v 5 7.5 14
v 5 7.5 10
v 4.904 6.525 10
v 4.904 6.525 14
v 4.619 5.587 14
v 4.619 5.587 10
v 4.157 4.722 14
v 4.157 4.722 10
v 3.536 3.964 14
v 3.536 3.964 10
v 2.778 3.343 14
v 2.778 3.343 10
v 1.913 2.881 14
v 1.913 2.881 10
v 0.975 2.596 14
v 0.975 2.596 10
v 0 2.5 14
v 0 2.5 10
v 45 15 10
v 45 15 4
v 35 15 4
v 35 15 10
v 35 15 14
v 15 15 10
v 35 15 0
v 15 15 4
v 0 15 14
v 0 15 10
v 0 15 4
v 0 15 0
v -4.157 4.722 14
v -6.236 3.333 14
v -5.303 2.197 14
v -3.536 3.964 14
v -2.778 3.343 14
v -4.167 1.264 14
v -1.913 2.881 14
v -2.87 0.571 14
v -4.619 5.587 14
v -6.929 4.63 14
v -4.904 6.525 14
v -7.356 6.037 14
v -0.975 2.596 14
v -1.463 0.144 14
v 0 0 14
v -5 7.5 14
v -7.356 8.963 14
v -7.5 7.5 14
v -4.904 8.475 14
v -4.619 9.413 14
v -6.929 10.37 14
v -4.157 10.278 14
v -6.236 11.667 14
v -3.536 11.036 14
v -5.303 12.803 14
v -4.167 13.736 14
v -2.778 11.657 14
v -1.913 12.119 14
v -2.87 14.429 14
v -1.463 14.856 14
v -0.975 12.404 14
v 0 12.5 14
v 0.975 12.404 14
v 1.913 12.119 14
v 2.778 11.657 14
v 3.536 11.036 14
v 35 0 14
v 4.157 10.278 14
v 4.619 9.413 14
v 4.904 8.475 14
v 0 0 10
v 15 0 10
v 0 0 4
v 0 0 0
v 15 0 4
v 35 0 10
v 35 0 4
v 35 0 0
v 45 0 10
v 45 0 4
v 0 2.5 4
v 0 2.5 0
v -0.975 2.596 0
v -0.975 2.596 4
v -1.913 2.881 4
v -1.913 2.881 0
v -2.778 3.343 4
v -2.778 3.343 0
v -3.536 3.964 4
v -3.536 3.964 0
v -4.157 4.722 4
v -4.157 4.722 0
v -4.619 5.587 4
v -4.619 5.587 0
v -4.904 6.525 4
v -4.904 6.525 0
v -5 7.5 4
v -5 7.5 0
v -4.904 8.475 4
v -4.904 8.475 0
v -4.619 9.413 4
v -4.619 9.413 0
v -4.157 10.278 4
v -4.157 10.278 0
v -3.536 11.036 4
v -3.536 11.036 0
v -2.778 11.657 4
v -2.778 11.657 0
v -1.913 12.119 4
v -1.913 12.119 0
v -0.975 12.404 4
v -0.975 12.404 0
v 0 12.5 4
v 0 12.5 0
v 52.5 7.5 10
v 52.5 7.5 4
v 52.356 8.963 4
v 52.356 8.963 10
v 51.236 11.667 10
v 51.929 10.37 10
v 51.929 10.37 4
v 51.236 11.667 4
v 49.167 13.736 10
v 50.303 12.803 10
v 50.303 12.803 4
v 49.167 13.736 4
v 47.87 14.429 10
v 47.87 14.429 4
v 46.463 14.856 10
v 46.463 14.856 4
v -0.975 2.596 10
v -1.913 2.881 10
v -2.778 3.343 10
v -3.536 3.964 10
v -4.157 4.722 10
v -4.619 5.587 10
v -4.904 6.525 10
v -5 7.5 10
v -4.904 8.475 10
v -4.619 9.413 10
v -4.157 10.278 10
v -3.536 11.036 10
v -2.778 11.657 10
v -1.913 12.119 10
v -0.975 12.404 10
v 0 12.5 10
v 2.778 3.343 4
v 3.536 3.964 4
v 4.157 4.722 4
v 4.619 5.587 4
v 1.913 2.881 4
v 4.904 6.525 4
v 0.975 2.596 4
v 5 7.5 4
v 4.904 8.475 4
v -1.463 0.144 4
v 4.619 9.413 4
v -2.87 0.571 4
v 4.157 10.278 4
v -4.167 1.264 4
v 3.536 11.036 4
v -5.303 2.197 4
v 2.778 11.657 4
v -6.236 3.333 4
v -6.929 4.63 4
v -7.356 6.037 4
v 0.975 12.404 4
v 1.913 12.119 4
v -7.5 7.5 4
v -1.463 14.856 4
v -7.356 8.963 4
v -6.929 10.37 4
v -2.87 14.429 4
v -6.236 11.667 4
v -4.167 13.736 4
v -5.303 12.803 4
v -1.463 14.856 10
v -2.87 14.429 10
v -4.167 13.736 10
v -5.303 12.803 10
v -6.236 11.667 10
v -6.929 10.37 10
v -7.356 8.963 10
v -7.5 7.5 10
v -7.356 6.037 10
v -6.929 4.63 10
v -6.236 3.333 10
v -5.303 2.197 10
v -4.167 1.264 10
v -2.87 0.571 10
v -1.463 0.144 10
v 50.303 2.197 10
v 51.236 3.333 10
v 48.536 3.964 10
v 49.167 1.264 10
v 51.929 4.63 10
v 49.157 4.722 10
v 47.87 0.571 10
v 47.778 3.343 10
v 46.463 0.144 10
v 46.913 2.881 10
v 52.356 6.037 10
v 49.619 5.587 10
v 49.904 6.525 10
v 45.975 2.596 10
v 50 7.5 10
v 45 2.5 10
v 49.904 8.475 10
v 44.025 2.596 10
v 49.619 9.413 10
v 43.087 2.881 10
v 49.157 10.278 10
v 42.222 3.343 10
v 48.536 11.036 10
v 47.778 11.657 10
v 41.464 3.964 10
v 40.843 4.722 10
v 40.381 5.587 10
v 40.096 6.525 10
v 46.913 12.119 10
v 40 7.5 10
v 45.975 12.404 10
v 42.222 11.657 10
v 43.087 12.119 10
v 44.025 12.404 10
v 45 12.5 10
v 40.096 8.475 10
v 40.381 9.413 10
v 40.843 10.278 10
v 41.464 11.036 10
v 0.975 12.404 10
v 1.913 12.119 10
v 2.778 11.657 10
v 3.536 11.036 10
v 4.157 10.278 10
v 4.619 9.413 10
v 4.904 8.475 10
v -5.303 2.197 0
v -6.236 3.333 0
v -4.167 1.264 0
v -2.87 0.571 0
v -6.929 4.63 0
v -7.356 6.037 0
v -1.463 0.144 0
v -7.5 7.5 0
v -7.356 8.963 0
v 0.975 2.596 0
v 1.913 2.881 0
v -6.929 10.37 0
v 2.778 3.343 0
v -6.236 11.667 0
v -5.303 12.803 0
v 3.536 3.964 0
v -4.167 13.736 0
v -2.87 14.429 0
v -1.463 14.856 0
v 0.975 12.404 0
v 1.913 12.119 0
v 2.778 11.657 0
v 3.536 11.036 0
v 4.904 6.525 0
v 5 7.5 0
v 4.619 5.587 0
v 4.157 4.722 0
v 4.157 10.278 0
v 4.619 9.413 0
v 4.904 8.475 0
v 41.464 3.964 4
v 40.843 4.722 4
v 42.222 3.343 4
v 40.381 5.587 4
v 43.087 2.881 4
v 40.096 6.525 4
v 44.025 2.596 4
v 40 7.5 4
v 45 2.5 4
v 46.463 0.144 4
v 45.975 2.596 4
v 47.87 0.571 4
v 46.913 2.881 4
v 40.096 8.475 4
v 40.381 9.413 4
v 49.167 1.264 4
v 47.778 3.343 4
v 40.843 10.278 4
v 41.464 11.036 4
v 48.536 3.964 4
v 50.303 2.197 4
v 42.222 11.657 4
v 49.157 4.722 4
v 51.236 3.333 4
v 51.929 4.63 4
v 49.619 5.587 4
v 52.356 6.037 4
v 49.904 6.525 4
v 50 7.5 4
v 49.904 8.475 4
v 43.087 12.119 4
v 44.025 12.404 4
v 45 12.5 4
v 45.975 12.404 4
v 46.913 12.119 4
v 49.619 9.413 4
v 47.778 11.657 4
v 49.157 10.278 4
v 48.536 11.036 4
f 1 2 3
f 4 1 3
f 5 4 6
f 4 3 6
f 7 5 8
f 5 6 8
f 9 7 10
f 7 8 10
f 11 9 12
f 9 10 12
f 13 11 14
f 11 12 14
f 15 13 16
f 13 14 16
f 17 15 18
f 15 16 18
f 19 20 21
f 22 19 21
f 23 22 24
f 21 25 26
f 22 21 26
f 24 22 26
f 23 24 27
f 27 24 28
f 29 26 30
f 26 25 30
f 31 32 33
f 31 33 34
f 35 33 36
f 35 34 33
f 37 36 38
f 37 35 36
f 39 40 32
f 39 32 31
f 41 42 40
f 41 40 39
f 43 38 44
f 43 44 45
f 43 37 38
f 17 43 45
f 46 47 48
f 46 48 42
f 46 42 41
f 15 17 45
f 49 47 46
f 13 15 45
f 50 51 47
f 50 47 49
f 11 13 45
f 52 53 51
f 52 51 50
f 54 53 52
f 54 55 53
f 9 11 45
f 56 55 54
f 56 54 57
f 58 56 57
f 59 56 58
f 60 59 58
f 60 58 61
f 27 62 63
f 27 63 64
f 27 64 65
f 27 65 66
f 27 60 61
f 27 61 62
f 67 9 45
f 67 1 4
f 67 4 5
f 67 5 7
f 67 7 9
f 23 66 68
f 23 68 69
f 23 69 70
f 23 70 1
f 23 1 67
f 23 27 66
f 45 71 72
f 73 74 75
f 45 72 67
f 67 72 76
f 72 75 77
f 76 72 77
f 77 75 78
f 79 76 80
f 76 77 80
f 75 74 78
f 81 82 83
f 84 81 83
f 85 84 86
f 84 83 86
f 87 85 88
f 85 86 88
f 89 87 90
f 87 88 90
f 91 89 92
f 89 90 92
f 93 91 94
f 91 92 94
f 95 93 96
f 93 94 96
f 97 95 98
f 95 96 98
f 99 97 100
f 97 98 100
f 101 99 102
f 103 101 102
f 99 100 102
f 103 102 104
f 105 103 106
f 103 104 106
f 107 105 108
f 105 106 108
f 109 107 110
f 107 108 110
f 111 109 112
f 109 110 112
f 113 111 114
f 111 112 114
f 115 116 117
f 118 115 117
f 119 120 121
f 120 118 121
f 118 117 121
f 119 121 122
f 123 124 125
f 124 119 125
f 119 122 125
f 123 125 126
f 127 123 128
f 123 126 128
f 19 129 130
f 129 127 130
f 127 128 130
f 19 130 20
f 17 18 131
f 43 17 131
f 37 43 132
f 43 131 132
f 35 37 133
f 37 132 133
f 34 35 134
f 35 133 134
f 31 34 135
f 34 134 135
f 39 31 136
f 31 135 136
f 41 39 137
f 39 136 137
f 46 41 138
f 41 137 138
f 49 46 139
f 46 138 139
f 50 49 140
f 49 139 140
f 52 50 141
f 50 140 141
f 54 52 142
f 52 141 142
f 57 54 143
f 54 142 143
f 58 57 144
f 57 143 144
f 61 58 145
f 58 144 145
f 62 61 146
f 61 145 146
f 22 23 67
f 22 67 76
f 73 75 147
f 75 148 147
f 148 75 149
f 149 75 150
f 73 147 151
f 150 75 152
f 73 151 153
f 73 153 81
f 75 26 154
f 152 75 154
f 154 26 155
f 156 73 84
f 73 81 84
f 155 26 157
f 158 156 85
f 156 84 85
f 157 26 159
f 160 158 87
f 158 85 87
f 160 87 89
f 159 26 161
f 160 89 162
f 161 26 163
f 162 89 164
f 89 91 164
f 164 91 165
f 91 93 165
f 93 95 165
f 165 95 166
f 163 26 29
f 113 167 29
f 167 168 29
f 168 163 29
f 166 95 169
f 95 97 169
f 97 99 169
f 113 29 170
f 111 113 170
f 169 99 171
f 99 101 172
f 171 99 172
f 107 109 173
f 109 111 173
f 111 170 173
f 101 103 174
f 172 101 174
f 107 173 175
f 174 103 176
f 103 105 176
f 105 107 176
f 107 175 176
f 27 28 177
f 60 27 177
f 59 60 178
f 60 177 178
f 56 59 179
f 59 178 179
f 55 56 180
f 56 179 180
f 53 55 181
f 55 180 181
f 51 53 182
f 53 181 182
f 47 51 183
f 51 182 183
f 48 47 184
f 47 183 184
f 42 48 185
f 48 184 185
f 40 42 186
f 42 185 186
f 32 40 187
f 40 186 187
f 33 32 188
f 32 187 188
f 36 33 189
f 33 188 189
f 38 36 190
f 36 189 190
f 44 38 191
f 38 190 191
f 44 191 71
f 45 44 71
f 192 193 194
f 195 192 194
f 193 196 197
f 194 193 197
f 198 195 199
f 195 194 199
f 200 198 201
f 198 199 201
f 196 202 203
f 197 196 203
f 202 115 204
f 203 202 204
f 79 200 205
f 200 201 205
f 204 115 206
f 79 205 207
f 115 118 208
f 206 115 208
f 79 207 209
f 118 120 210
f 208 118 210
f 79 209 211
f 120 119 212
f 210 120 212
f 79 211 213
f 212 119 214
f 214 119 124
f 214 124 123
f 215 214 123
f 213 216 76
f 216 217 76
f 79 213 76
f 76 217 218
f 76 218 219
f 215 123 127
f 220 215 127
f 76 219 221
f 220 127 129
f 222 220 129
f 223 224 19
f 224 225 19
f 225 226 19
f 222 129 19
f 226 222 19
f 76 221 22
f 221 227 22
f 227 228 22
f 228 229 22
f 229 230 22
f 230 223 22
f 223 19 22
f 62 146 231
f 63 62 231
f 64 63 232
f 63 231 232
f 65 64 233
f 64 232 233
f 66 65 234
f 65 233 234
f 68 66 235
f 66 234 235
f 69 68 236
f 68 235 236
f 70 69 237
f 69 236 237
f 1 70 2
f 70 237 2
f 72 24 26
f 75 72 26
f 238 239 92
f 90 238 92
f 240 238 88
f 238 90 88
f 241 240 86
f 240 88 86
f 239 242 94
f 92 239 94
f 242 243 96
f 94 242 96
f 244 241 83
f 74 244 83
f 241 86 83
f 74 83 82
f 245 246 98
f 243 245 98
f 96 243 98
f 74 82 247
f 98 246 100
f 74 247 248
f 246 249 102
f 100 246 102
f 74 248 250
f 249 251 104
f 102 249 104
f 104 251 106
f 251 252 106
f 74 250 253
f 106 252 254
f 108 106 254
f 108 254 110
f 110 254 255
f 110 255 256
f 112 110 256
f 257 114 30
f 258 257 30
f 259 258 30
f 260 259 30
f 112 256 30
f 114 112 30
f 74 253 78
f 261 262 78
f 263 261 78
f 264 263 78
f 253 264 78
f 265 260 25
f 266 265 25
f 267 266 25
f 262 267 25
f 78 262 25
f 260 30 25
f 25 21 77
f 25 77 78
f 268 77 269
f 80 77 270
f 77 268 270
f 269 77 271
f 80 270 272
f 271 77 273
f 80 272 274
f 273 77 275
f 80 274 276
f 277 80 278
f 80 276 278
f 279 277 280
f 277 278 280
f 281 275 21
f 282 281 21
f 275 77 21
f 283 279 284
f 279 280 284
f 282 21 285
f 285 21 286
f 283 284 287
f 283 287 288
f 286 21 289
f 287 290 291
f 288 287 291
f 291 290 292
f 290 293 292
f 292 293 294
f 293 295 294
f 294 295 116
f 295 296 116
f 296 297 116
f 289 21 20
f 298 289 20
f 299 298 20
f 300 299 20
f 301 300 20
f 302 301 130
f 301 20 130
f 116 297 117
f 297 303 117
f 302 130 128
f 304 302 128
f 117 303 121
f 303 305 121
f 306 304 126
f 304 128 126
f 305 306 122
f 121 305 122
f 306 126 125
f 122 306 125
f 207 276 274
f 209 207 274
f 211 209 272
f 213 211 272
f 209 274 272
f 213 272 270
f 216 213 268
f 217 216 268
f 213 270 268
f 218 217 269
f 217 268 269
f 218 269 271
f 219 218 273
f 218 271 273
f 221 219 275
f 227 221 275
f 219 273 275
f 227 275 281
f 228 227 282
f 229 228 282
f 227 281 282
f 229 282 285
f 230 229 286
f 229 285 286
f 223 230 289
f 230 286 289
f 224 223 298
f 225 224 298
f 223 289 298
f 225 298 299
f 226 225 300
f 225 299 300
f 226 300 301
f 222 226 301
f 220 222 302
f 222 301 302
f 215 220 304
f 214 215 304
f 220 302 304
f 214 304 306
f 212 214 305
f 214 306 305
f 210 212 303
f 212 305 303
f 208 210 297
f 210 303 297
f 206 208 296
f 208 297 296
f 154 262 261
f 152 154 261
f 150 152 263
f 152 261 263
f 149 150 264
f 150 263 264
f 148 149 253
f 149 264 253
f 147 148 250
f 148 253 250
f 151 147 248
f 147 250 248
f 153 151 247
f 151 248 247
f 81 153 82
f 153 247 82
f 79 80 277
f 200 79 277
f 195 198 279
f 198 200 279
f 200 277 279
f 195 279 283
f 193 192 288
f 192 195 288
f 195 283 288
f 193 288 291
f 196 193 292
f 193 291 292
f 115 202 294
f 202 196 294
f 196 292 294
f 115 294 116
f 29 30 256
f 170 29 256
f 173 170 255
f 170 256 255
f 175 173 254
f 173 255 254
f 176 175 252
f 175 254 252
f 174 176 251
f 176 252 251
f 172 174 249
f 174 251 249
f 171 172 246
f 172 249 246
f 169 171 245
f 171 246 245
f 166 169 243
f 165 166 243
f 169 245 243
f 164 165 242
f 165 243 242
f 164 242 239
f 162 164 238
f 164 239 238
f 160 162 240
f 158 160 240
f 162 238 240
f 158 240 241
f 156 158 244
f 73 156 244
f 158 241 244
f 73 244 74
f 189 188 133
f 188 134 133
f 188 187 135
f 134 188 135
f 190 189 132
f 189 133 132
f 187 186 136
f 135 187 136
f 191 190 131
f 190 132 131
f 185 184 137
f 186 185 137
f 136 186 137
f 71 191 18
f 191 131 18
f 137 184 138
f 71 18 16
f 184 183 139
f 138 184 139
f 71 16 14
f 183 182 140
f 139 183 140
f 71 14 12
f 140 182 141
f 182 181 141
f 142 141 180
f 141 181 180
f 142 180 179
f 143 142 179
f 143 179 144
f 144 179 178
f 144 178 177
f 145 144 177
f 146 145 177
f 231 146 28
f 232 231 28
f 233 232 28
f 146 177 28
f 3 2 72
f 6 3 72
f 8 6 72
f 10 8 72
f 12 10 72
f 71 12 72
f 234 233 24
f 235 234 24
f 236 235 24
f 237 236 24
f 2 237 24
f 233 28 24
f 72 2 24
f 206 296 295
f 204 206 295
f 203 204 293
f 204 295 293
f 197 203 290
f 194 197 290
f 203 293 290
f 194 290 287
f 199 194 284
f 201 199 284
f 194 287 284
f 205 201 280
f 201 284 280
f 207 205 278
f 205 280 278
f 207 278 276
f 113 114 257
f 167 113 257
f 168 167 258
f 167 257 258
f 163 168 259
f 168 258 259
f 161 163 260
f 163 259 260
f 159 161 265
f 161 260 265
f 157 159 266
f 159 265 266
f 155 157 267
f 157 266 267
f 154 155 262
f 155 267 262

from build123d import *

# Parameters (mm, degrees)
BOSS_EXTRU_1_DEPTH      = 14
ESQUISSE2_W             = 7.5
ESQUISSE2_H             = 6
ESQUISSE2_W_2           = 15
ESQUISSE2_W_3           = 10
ESQUISSE2_H_2           = 4
ENL_V_MAT_EXTRU_1_DEPTH = 15


with BuildPart() as part:
    # Esquisse1 → Boss.-Extru.1 (new body)
    with BuildSketch(Plane.XY):
        with BuildLine():
            ThreePointArc((7.5, 7.5), (5.303300859, 2.196699141), (0, 0))
            Line((0, 0), (45, 0))
            ThreePointArc((45, 0), (37.5, 7.5), (45, 15))
            Line((45, 15), (0, 15))
            ThreePointArc((0, 15), (5.303300859, 12.803300859), (7.5, 7.5))
        make_face()
        with BuildLine():
            ThreePointArc((45, 15), (37.5, 7.5), (45, 0))
            Line((45, 0), (45, 2.5))
            ThreePointArc((45, 2.5), (40, 7.5), (45, 12.5))
            Line((45, 12.5), (45, 15))
        make_face()
        with BuildLine():
            Line((45, 2.5), (45, 0))
            ThreePointArc((45, 0), (50.303300859, 2.196699141), (52.5, 7.5))
            ThreePointArc((52.5, 7.5), (50.303300859, 12.803300859), (45, 15))
            Line((45, 15), (45, 12.5))
            ThreePointArc((45, 12.5), (48.535533906, 11.035533906), (50, 7.5))
            ThreePointArc((50, 7.5), (48.535533906, 3.964466094), (45, 2.5))
        make_face()
        with BuildLine():
            ThreePointArc((0, 15), (-7.5, 7.5), (0, 0))
            Line((0, 0), (0, 2.5))
            ThreePointArc((0, 2.5), (-5, 7.5), (0, 12.5))
            Line((0, 12.5), (0, 15))
        make_face()
        with BuildLine():
            Line((0, 2.5), (0, 0))
            ThreePointArc((0, 0), (5.303300859, 2.196699141), (7.5, 7.5))
            ThreePointArc((7.5, 7.5), (5.303300859, 12.803300859), (0, 15))
            Line((0, 15), (0, 12.5))
            ThreePointArc((0, 12.5), (3.535533906, 11.035533906), (5, 7.5))
            ThreePointArc((5, 7.5), (3.535533906, 3.964466094), (0, 2.5))
        make_face()
    extrude(amount=BOSS_EXTRU_1_DEPTH)

    # Esquisse2 → Enlèv. mat.-Extru.1 (cut)
    with BuildSketch(Plane(origin=(0, 15, 0), x_dir=(1, 0, 0), z_dir=(0, 1, 0))):
        with Locations((-3.75, -7)):
            Rectangle(ESQUISSE2_W, ESQUISSE2_H)
        with Locations((7.5, -7)):
            Rectangle(ESQUISSE2_W_2, ESQUISSE2_H)
        with Locations((40, -2)):
            Rectangle(ESQUISSE2_W_3, ESQUISSE2_H_2)
        with Locations((48.75, -2)):
            Rectangle(ESQUISSE2_W, ESQUISSE2_H_2)
        with Locations((48.75, -12)):
            Rectangle(ESQUISSE2_W, ESQUISSE2_H_2)
        with Locations((40, -12)):
            Rectangle(ESQUISSE2_W_3, ESQUISSE2_H_2)
    extrude(amount=-ENL_V_MAT_EXTRU_1_DEPTH, mode=Mode.SUBTRACT)


solid = part.part
